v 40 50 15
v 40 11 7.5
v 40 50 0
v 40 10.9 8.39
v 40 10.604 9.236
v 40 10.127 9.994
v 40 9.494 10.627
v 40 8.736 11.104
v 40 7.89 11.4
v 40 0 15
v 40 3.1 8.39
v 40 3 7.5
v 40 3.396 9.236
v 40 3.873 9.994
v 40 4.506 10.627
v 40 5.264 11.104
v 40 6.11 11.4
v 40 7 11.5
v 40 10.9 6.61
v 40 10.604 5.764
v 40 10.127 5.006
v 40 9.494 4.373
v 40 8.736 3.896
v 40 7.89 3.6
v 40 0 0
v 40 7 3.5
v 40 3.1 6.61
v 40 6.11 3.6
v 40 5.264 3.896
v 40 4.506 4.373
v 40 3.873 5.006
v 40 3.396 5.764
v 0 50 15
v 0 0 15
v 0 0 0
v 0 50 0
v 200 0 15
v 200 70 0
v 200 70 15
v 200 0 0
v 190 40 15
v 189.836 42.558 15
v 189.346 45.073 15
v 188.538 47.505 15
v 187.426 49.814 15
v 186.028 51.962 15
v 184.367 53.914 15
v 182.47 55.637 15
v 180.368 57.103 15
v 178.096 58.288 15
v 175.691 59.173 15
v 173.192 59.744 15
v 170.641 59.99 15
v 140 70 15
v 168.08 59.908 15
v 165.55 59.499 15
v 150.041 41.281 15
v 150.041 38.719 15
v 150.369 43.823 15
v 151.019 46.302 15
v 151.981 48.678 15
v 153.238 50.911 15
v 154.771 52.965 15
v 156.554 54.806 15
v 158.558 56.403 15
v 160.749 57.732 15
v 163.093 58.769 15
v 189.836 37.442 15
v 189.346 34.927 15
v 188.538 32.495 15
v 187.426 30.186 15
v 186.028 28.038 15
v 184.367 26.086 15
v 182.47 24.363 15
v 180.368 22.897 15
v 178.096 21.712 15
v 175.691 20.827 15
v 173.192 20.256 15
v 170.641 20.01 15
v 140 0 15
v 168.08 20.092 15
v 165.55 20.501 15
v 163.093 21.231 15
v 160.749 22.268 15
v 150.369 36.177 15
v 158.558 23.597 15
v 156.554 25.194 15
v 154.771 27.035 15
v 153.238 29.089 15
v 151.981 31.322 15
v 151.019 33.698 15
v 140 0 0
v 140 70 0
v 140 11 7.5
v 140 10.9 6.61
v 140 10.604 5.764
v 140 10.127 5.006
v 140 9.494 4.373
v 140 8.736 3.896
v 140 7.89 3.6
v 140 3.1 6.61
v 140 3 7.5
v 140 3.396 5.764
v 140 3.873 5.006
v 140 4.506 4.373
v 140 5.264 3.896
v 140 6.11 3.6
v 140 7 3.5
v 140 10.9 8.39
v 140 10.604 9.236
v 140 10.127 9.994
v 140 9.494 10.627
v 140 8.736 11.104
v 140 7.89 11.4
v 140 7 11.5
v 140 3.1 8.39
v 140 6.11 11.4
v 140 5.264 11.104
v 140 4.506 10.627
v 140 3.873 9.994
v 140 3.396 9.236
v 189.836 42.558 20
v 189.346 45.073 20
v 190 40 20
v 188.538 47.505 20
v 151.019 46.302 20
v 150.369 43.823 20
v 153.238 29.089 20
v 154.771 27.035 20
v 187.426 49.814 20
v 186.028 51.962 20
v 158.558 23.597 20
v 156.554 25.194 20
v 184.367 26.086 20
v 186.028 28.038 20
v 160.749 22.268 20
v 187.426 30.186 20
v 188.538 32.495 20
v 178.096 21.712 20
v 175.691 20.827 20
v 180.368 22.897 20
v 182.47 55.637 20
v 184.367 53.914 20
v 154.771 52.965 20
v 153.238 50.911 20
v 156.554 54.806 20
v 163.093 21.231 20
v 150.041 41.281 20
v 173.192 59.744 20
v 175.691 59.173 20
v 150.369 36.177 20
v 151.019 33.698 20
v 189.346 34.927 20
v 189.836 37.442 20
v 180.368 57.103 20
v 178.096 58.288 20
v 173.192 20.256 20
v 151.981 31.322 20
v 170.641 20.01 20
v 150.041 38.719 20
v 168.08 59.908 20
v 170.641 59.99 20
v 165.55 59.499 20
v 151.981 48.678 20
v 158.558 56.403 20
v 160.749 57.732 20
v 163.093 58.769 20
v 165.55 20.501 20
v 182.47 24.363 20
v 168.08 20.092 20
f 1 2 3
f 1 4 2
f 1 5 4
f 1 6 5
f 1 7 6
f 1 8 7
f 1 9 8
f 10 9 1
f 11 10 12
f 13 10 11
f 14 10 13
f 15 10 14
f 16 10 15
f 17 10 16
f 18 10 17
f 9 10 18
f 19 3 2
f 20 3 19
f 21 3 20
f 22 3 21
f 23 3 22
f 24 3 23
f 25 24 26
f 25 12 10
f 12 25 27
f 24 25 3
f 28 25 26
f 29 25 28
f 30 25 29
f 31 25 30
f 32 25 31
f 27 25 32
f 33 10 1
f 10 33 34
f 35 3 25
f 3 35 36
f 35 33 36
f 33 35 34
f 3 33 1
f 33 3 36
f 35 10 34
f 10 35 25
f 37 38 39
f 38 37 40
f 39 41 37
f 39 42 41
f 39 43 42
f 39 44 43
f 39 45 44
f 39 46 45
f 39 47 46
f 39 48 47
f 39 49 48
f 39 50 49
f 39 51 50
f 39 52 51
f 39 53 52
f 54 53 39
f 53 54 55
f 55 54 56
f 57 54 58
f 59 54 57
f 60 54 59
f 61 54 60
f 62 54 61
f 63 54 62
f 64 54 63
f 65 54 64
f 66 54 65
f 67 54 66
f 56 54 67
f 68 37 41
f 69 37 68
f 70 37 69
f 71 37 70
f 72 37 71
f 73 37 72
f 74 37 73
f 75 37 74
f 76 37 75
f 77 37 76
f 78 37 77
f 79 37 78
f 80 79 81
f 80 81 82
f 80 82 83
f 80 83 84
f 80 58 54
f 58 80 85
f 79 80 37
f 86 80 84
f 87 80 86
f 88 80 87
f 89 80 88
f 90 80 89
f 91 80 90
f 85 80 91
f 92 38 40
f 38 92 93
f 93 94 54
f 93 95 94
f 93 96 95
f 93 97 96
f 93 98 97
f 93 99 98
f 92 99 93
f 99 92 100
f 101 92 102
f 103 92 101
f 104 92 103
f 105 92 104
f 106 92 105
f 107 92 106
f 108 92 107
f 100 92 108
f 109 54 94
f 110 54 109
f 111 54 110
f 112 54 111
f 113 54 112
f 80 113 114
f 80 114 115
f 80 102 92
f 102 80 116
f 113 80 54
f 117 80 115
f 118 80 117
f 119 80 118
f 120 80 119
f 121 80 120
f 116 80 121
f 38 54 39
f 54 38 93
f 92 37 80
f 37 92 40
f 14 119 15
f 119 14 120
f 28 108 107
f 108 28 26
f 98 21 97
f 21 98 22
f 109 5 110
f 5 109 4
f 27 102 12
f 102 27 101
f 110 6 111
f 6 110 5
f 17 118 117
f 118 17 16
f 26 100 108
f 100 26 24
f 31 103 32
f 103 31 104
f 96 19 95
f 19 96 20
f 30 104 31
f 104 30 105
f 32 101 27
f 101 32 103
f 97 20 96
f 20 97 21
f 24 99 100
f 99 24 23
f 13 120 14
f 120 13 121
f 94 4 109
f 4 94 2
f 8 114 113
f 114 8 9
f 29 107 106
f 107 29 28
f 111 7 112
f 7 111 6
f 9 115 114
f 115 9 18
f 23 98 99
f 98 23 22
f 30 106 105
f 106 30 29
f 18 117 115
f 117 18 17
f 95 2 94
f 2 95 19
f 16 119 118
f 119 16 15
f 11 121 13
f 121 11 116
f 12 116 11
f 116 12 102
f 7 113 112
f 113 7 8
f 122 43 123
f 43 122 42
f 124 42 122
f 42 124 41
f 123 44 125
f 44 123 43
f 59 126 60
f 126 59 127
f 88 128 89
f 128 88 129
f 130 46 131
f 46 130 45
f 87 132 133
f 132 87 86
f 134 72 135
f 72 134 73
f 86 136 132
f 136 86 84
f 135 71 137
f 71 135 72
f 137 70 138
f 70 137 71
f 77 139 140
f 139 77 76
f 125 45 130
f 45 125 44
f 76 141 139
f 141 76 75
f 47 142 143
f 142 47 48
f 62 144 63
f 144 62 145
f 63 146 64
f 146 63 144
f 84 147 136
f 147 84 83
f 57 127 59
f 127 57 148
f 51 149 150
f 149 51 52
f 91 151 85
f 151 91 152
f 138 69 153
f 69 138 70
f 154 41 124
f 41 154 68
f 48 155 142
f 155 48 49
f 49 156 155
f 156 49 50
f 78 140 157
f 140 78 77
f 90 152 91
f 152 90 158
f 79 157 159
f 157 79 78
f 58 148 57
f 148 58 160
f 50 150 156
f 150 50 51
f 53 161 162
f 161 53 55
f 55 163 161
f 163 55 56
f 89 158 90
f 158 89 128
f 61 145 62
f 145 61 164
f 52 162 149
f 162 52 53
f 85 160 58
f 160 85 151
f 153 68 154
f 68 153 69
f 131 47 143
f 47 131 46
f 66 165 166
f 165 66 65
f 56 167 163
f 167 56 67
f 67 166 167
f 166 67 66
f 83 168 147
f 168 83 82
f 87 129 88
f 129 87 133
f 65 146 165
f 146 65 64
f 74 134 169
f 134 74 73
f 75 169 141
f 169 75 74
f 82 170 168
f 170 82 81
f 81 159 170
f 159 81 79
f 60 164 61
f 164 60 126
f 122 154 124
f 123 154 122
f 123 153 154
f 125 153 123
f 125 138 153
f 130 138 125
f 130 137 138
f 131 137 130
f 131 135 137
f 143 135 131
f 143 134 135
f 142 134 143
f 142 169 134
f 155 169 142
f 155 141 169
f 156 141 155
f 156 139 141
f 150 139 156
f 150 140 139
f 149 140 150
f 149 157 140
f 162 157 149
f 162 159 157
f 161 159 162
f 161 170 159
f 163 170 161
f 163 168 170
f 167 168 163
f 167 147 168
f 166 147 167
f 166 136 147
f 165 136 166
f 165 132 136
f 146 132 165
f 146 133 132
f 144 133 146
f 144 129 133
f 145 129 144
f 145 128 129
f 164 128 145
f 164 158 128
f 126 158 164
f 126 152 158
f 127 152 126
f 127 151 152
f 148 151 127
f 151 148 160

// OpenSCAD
cube([40,50,15]);

translate([200-60,0,0])
cube([60,70,15]);

translate([0,7,15/2])
#rod();

tool_d=40;

translate([200-tool_d/2-10,tool_d/2+20,0])
#cylinder(d=tool_d,h=15+5,$fn=49);

module rod()
{
	rod_d=8;
	rod_l=200;

	//translate([0,0,rod_d/2])
	rotate([0,90,0])
	cylinder(d=rod_d,h=rod_l,center=false,$fn=28);
}
